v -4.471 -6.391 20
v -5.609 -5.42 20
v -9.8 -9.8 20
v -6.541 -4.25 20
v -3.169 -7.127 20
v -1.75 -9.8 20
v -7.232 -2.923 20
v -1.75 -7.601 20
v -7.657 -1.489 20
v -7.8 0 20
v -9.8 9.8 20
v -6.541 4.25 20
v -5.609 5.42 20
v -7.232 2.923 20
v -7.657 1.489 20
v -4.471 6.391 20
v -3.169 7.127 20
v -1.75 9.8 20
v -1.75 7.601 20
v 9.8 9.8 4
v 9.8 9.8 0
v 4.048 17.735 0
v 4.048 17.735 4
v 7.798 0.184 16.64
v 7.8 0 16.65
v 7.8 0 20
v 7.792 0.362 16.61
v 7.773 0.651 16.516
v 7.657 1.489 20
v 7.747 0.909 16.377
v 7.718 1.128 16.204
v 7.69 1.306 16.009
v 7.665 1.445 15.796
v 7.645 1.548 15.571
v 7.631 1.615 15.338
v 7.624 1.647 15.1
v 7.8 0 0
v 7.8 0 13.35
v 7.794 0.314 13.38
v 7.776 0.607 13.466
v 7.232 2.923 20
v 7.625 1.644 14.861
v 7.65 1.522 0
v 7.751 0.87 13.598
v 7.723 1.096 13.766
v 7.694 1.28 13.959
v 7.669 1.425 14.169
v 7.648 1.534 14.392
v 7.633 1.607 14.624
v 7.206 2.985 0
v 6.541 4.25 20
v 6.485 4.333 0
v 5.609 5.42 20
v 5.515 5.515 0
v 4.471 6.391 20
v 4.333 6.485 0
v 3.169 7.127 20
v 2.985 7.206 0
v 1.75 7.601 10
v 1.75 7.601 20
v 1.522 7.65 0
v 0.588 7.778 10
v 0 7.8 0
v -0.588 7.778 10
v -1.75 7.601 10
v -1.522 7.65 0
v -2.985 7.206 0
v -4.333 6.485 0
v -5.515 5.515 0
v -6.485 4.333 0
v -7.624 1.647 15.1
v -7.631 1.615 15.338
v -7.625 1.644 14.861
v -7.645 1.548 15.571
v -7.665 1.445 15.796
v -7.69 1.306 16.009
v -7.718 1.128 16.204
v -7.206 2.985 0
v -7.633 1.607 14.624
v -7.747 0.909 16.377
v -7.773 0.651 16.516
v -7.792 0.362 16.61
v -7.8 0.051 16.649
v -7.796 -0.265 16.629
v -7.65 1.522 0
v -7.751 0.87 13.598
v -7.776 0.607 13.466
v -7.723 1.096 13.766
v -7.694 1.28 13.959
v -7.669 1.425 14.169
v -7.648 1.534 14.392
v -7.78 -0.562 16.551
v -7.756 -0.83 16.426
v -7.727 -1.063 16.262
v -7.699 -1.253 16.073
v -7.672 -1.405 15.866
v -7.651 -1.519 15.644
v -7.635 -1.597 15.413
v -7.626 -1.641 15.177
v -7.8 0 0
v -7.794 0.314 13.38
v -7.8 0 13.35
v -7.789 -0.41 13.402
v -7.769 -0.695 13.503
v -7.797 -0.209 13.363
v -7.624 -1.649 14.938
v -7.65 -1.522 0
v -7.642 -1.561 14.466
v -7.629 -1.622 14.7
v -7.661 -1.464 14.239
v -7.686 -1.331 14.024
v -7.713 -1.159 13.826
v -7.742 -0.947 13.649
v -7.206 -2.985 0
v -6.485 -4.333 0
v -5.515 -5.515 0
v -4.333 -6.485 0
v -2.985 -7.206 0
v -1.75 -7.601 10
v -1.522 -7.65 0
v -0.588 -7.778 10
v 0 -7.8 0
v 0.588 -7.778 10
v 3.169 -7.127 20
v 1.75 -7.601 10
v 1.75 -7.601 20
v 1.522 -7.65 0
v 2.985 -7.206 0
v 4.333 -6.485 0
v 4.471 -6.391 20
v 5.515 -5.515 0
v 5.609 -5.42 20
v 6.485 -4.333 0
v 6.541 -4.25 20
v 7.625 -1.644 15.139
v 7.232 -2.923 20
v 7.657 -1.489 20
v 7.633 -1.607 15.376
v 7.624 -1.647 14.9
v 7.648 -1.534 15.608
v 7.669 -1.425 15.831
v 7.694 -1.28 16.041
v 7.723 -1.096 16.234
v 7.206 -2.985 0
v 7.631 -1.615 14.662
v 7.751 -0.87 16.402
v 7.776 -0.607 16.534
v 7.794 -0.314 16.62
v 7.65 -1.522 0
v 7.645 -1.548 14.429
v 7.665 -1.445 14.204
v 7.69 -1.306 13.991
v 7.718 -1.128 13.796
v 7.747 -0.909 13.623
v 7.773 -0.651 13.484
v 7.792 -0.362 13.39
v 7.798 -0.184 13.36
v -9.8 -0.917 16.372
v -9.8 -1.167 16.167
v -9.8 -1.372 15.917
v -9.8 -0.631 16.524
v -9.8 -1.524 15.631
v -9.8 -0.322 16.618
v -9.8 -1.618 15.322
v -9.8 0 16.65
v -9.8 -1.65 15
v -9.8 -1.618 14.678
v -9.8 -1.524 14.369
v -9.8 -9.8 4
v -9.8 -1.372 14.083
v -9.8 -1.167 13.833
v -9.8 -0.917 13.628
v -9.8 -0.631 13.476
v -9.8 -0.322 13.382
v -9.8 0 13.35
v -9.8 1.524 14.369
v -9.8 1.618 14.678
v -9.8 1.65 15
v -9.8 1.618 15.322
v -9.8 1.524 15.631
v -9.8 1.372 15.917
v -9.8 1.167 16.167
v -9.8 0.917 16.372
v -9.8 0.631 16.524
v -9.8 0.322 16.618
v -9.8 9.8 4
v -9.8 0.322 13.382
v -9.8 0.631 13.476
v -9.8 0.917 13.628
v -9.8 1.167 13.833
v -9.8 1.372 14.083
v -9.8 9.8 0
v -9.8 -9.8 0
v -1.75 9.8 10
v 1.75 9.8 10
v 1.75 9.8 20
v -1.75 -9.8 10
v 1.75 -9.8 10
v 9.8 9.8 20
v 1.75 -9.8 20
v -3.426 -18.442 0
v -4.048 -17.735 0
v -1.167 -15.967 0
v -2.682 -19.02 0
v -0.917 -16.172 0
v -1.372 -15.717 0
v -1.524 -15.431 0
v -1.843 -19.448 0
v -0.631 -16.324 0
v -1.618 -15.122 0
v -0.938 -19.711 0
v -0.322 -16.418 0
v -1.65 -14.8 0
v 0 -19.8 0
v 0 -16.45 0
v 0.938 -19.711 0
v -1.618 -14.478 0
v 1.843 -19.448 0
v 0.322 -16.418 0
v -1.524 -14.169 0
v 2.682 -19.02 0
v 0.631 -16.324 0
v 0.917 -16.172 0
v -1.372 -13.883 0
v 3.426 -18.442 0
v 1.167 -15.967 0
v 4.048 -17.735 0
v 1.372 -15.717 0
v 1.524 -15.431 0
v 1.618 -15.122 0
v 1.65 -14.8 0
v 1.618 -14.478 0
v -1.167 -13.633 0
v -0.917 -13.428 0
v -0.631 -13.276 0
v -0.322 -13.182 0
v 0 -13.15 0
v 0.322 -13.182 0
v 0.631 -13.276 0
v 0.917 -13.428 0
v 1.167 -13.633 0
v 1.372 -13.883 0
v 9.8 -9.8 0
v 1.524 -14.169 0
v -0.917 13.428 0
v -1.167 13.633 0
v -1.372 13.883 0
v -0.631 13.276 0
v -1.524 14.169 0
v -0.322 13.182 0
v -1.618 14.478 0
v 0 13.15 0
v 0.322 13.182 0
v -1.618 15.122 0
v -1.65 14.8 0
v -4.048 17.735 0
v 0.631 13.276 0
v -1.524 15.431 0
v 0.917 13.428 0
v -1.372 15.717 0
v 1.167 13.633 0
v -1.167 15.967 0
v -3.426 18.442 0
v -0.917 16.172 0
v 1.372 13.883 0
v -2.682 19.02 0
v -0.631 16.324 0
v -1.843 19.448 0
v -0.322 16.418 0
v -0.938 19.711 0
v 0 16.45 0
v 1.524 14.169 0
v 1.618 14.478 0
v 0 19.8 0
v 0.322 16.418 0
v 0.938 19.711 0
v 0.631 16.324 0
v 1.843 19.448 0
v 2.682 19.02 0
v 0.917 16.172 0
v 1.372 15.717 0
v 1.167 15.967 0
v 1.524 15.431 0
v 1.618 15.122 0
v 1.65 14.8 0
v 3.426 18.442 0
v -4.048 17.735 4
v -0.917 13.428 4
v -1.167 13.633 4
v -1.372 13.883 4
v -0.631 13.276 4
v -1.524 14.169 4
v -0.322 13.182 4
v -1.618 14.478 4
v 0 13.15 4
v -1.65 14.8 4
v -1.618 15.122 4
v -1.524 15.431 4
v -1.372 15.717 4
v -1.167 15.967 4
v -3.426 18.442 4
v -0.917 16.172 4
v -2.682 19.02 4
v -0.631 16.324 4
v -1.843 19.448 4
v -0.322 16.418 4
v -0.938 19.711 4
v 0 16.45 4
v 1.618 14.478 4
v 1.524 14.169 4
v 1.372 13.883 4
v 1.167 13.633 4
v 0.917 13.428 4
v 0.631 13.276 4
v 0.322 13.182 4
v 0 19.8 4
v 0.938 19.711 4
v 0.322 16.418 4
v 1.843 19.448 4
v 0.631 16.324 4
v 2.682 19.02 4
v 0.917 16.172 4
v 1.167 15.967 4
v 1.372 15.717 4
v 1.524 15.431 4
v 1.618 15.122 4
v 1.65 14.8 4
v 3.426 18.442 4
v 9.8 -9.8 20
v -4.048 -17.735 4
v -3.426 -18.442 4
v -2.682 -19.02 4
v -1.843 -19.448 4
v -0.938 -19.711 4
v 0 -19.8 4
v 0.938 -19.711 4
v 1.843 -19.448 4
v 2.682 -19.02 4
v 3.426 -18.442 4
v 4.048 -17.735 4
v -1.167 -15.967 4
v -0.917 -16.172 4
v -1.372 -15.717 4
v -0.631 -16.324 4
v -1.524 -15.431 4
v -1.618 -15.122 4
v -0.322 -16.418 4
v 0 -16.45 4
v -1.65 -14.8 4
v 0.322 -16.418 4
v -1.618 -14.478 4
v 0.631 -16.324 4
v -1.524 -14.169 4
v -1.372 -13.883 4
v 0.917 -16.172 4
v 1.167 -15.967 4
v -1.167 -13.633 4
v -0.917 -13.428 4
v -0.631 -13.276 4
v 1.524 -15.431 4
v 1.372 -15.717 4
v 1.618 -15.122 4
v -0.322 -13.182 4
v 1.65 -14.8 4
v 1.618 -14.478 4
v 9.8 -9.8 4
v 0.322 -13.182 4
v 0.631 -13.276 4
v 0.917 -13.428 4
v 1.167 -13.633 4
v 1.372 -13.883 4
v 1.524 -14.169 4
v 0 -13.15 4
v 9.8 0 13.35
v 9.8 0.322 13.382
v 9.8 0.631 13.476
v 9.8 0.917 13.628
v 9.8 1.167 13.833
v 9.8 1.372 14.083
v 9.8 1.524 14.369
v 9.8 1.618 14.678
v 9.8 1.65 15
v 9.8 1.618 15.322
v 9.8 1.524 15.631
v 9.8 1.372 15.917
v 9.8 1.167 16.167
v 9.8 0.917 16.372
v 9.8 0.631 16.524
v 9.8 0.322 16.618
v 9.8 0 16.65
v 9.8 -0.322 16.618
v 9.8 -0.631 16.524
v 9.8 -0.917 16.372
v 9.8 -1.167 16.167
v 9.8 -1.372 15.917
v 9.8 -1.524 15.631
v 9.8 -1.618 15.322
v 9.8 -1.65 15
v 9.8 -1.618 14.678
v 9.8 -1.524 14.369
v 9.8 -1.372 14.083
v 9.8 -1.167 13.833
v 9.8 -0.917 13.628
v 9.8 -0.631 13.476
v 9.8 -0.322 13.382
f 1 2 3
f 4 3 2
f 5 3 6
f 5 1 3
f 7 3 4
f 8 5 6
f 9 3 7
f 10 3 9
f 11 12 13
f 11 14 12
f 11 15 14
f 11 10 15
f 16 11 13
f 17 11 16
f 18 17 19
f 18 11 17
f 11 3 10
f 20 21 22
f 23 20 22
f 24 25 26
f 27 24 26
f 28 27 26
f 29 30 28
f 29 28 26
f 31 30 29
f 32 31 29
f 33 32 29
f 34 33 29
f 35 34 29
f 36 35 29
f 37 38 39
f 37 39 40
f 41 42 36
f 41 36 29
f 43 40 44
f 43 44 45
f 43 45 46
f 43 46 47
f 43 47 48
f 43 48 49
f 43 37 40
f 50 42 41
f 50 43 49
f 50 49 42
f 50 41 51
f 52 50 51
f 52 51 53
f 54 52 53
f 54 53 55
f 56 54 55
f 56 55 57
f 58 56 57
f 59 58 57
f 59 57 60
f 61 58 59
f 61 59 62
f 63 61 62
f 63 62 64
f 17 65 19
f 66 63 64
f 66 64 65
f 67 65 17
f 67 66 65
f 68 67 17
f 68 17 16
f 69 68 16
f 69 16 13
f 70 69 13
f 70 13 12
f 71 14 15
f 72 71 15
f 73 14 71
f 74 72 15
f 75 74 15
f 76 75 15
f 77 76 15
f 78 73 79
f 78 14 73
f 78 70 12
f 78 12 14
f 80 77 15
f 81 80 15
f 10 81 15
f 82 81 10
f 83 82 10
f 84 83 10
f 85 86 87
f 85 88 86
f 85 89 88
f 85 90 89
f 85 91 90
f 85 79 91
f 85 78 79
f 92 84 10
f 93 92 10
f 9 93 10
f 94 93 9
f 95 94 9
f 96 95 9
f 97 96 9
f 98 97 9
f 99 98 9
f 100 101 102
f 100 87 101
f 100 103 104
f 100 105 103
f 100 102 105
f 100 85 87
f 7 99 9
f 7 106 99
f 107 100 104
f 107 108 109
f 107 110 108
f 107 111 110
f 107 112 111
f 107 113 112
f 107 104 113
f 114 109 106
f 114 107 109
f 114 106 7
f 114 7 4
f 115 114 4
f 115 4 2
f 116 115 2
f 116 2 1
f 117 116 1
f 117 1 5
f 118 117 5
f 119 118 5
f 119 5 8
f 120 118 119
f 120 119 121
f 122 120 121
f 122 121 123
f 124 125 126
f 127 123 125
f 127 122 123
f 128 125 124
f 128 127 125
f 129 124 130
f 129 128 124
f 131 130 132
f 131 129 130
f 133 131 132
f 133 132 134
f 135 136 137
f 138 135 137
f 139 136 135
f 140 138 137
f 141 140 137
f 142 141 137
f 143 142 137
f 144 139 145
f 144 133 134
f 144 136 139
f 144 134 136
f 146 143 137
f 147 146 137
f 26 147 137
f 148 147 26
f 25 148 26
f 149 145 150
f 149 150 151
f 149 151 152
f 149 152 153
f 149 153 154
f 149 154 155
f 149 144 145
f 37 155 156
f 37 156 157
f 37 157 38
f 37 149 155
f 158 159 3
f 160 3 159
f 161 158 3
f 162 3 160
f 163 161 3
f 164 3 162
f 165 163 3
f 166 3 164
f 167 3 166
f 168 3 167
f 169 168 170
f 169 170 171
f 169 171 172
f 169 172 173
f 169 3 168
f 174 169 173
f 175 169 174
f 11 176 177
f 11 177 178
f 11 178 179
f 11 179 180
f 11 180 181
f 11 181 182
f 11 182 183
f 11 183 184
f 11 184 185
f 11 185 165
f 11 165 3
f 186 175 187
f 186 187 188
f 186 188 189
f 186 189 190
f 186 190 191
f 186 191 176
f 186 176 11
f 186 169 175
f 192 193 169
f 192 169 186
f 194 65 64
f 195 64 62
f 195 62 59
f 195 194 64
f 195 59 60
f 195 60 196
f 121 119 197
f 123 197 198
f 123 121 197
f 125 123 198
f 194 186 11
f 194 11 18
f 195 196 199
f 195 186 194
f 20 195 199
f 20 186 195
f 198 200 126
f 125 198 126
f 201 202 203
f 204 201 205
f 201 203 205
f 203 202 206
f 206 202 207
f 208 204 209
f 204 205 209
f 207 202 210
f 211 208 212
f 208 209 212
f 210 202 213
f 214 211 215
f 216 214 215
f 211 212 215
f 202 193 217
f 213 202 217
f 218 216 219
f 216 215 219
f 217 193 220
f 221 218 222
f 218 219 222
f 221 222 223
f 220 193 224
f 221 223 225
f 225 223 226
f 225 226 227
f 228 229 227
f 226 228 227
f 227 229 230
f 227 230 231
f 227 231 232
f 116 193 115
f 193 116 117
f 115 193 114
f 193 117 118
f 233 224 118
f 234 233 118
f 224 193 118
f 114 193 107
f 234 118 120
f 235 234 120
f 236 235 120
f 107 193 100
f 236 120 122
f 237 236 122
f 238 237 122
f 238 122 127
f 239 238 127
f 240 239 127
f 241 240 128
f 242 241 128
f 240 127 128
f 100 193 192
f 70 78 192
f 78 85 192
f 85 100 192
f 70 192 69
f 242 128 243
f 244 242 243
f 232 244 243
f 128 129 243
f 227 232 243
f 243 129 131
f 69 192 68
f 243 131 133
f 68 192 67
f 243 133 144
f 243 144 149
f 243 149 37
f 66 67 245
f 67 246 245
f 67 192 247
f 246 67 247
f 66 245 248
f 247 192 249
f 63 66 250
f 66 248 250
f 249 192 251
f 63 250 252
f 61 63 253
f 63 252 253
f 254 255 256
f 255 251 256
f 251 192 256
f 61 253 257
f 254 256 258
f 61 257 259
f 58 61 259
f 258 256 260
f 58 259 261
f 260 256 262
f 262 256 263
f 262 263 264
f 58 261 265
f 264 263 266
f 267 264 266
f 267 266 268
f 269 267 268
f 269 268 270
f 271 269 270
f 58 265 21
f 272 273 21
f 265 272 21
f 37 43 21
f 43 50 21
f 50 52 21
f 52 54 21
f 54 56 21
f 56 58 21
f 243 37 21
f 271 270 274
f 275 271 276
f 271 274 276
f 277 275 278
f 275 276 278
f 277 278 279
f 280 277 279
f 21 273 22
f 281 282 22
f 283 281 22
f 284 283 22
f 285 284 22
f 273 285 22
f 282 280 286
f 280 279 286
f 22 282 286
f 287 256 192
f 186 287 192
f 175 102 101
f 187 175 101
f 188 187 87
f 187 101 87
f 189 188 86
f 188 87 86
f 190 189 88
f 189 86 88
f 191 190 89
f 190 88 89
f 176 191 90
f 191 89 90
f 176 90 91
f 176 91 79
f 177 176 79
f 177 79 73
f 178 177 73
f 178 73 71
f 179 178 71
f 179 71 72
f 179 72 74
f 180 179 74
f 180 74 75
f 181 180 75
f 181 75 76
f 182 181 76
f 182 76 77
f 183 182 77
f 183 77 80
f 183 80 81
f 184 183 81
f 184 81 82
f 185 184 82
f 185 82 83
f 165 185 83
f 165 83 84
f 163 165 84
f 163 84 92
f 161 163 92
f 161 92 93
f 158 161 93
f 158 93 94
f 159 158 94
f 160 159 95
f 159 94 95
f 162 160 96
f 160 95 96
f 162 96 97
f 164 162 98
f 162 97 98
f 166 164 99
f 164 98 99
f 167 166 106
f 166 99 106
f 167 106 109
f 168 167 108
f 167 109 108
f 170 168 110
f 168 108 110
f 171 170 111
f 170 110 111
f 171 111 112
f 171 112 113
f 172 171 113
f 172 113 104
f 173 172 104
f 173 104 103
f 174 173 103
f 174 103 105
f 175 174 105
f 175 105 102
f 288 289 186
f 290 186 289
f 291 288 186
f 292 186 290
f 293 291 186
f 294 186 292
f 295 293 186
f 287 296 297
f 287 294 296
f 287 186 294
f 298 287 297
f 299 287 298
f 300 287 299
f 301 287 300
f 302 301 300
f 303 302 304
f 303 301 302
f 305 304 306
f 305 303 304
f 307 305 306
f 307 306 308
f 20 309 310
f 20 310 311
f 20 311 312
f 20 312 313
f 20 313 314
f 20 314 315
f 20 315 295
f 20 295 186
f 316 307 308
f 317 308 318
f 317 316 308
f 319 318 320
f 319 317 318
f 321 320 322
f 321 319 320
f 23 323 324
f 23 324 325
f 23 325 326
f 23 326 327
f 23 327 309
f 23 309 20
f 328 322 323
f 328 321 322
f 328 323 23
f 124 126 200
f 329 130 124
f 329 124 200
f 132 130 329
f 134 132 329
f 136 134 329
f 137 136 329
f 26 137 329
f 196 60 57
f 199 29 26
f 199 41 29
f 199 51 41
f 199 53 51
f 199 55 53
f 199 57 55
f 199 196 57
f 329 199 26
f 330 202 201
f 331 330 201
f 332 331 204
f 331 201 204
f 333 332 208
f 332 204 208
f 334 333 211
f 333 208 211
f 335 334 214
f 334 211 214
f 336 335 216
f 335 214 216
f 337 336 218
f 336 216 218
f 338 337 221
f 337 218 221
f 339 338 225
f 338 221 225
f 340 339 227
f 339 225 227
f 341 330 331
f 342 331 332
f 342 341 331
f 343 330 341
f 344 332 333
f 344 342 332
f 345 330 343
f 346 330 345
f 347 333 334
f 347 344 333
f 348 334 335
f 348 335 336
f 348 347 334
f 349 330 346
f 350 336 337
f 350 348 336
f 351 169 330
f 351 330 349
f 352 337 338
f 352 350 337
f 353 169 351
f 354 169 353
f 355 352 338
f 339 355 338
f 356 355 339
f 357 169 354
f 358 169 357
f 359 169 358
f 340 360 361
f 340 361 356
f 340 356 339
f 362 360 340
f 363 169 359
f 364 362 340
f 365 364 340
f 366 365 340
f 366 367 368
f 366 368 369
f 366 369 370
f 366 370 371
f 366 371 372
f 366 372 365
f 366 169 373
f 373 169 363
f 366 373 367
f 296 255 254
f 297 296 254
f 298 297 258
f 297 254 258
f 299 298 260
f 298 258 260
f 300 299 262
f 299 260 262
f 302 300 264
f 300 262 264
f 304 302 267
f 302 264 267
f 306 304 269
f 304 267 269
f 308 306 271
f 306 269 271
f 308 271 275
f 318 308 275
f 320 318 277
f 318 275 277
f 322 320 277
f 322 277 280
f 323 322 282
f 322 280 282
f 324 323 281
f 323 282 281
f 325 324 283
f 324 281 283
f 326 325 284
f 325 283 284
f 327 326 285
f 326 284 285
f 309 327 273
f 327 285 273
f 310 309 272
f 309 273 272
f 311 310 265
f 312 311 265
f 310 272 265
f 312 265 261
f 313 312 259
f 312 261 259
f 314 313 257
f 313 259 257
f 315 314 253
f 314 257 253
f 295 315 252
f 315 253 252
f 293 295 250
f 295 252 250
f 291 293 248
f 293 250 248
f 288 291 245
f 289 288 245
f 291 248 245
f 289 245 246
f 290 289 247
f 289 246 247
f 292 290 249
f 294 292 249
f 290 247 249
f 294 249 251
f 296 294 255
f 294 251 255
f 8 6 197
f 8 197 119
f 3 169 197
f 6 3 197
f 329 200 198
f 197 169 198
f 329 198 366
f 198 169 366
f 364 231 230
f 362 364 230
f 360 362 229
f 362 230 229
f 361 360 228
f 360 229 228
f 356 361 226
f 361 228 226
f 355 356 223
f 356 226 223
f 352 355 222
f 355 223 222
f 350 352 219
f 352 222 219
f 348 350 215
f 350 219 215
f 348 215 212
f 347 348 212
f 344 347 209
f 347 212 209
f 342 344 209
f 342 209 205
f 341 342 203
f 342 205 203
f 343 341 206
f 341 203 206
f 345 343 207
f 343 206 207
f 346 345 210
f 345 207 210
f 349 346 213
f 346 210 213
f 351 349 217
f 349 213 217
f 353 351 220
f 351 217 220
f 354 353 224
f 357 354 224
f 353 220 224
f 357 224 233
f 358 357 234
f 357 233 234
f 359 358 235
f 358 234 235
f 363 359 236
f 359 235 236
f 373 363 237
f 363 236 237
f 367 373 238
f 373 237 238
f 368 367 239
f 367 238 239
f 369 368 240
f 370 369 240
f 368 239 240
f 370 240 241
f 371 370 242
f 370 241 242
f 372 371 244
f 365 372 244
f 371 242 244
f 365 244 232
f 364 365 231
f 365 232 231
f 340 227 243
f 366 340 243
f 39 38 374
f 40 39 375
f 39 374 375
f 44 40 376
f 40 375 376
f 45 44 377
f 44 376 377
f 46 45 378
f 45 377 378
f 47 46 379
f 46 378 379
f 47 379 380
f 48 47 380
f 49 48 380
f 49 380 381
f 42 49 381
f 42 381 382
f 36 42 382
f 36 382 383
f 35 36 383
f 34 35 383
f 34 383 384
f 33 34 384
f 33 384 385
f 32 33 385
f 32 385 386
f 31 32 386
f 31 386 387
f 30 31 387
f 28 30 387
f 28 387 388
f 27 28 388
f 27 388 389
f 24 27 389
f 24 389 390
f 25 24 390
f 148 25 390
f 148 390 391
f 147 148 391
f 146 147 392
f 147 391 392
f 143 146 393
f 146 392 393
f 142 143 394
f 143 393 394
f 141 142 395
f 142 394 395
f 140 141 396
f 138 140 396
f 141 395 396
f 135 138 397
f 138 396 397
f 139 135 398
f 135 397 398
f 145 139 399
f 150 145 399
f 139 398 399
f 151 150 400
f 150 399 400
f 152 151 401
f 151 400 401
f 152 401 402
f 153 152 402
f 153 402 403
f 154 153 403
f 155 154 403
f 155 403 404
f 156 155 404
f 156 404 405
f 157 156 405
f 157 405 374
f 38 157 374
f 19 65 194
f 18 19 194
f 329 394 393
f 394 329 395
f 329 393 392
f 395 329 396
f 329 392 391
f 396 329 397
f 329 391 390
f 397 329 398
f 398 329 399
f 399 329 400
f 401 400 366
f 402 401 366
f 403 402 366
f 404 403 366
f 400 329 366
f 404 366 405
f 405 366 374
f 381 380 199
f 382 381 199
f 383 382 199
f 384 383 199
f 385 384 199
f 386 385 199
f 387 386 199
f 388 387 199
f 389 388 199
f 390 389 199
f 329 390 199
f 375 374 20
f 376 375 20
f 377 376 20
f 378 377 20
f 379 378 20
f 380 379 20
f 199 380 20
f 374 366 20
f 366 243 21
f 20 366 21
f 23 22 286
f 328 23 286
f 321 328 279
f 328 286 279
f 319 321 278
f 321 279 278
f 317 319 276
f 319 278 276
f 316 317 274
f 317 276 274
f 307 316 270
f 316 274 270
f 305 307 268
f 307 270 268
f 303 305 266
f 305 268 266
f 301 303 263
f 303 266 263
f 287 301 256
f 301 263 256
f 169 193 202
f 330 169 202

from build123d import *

# Parameters (mm, degrees)
SKETCH_1_W          = 19.6
SKETCH_1_H          = 19.6
SKETCH_1_R          = 7.8
EXTRUDE_1_DEPTH     = 20
SKETCH_2_R          = 1.65
EXTRUDE_2_DEPTH     = 4
SKETCH_3_R          = 1.65
CUT_EXTRUDE_1_DEPTH = 35.295772334
SKETCH_4_W          = 3.5
SKETCH_4_H          = 19.6
CUT_EXTRUDE_2_DEPTH = 10


with BuildPart() as part:
    # 草图1 → 凸台-拉伸1 (new body)
    with BuildSketch(Plane.XY):
        Rectangle(SKETCH_1_W, SKETCH_1_H)
        Circle(SKETCH_1_R, mode=Mode.SUBTRACT)
    extrude(amount=EXTRUDE_1_DEPTH)

    # 草图2 → 凸台-拉伸2 (add)
    # profile 1 of 2: a face of its own
    with BuildSketch(Plane(origin=(0, 0, 0), x_dir=(-1, 0, 0), z_dir=(0, 0, -1))):
        with BuildLine():
            Line((-9.8, 9.8), (-4.048248513, 17.734567085))
            ThreePointArc((-4.048248513, 17.734567085), (0, 19.8), (4.048248513, 17.734567085))
            Line((4.048248513, 17.734567085), (9.8, 9.8))
            Line((9.8, 9.8), (-9.8, 9.8))
        make_face()
        with Locations((0, 14.8)):
            Circle(SKETCH_2_R, mode=Mode.SUBTRACT)
    # profile 2 of 2: a face of its own
    with BuildSketch(Plane(origin=(0, 0, 0), x_dir=(-1, 0, 0), z_dir=(0, 0, -1))):
        with BuildLine():
            Line((-9.8, -9.8), (9.8, -9.8))
            Line((9.8, -9.8), (4.048248513, -17.734567085))
            ThreePointArc((4.048248513, -17.734567085), (0, -19.8), (-4.048248513, -17.734567085))
            Line((-4.048248513, -17.734567085), (-9.8, -9.8))
        make_face()
        with Locations(Location((0, -14.8, 0), (0, 0, 180))):
            Circle(SKETCH_2_R, mode=Mode.SUBTRACT)
    extrude(amount=-EXTRUDE_2_DEPTH)

    # 草图3 → 切除-拉伸1 (cut, through all)
    with BuildSketch(Plane(origin=(9.8, 0, 0), x_dir=(0, 0, -1), z_dir=(1, 0, 0))):
        with Locations((-15, 0)):
            Circle(SKETCH_3_R)
    extrude(amount=-CUT_EXTRUDE_1_DEPTH, mode=Mode.SUBTRACT)

    # 草图4 → 切除-拉伸2 (cut)
    with BuildSketch(Plane.XY.offset(20)):
        Rectangle(SKETCH_4_W, SKETCH_4_H)
    extrude(amount=-CUT_EXTRUDE_2_DEPTH, mode=Mode.SUBTRACT)


solid = part.part
